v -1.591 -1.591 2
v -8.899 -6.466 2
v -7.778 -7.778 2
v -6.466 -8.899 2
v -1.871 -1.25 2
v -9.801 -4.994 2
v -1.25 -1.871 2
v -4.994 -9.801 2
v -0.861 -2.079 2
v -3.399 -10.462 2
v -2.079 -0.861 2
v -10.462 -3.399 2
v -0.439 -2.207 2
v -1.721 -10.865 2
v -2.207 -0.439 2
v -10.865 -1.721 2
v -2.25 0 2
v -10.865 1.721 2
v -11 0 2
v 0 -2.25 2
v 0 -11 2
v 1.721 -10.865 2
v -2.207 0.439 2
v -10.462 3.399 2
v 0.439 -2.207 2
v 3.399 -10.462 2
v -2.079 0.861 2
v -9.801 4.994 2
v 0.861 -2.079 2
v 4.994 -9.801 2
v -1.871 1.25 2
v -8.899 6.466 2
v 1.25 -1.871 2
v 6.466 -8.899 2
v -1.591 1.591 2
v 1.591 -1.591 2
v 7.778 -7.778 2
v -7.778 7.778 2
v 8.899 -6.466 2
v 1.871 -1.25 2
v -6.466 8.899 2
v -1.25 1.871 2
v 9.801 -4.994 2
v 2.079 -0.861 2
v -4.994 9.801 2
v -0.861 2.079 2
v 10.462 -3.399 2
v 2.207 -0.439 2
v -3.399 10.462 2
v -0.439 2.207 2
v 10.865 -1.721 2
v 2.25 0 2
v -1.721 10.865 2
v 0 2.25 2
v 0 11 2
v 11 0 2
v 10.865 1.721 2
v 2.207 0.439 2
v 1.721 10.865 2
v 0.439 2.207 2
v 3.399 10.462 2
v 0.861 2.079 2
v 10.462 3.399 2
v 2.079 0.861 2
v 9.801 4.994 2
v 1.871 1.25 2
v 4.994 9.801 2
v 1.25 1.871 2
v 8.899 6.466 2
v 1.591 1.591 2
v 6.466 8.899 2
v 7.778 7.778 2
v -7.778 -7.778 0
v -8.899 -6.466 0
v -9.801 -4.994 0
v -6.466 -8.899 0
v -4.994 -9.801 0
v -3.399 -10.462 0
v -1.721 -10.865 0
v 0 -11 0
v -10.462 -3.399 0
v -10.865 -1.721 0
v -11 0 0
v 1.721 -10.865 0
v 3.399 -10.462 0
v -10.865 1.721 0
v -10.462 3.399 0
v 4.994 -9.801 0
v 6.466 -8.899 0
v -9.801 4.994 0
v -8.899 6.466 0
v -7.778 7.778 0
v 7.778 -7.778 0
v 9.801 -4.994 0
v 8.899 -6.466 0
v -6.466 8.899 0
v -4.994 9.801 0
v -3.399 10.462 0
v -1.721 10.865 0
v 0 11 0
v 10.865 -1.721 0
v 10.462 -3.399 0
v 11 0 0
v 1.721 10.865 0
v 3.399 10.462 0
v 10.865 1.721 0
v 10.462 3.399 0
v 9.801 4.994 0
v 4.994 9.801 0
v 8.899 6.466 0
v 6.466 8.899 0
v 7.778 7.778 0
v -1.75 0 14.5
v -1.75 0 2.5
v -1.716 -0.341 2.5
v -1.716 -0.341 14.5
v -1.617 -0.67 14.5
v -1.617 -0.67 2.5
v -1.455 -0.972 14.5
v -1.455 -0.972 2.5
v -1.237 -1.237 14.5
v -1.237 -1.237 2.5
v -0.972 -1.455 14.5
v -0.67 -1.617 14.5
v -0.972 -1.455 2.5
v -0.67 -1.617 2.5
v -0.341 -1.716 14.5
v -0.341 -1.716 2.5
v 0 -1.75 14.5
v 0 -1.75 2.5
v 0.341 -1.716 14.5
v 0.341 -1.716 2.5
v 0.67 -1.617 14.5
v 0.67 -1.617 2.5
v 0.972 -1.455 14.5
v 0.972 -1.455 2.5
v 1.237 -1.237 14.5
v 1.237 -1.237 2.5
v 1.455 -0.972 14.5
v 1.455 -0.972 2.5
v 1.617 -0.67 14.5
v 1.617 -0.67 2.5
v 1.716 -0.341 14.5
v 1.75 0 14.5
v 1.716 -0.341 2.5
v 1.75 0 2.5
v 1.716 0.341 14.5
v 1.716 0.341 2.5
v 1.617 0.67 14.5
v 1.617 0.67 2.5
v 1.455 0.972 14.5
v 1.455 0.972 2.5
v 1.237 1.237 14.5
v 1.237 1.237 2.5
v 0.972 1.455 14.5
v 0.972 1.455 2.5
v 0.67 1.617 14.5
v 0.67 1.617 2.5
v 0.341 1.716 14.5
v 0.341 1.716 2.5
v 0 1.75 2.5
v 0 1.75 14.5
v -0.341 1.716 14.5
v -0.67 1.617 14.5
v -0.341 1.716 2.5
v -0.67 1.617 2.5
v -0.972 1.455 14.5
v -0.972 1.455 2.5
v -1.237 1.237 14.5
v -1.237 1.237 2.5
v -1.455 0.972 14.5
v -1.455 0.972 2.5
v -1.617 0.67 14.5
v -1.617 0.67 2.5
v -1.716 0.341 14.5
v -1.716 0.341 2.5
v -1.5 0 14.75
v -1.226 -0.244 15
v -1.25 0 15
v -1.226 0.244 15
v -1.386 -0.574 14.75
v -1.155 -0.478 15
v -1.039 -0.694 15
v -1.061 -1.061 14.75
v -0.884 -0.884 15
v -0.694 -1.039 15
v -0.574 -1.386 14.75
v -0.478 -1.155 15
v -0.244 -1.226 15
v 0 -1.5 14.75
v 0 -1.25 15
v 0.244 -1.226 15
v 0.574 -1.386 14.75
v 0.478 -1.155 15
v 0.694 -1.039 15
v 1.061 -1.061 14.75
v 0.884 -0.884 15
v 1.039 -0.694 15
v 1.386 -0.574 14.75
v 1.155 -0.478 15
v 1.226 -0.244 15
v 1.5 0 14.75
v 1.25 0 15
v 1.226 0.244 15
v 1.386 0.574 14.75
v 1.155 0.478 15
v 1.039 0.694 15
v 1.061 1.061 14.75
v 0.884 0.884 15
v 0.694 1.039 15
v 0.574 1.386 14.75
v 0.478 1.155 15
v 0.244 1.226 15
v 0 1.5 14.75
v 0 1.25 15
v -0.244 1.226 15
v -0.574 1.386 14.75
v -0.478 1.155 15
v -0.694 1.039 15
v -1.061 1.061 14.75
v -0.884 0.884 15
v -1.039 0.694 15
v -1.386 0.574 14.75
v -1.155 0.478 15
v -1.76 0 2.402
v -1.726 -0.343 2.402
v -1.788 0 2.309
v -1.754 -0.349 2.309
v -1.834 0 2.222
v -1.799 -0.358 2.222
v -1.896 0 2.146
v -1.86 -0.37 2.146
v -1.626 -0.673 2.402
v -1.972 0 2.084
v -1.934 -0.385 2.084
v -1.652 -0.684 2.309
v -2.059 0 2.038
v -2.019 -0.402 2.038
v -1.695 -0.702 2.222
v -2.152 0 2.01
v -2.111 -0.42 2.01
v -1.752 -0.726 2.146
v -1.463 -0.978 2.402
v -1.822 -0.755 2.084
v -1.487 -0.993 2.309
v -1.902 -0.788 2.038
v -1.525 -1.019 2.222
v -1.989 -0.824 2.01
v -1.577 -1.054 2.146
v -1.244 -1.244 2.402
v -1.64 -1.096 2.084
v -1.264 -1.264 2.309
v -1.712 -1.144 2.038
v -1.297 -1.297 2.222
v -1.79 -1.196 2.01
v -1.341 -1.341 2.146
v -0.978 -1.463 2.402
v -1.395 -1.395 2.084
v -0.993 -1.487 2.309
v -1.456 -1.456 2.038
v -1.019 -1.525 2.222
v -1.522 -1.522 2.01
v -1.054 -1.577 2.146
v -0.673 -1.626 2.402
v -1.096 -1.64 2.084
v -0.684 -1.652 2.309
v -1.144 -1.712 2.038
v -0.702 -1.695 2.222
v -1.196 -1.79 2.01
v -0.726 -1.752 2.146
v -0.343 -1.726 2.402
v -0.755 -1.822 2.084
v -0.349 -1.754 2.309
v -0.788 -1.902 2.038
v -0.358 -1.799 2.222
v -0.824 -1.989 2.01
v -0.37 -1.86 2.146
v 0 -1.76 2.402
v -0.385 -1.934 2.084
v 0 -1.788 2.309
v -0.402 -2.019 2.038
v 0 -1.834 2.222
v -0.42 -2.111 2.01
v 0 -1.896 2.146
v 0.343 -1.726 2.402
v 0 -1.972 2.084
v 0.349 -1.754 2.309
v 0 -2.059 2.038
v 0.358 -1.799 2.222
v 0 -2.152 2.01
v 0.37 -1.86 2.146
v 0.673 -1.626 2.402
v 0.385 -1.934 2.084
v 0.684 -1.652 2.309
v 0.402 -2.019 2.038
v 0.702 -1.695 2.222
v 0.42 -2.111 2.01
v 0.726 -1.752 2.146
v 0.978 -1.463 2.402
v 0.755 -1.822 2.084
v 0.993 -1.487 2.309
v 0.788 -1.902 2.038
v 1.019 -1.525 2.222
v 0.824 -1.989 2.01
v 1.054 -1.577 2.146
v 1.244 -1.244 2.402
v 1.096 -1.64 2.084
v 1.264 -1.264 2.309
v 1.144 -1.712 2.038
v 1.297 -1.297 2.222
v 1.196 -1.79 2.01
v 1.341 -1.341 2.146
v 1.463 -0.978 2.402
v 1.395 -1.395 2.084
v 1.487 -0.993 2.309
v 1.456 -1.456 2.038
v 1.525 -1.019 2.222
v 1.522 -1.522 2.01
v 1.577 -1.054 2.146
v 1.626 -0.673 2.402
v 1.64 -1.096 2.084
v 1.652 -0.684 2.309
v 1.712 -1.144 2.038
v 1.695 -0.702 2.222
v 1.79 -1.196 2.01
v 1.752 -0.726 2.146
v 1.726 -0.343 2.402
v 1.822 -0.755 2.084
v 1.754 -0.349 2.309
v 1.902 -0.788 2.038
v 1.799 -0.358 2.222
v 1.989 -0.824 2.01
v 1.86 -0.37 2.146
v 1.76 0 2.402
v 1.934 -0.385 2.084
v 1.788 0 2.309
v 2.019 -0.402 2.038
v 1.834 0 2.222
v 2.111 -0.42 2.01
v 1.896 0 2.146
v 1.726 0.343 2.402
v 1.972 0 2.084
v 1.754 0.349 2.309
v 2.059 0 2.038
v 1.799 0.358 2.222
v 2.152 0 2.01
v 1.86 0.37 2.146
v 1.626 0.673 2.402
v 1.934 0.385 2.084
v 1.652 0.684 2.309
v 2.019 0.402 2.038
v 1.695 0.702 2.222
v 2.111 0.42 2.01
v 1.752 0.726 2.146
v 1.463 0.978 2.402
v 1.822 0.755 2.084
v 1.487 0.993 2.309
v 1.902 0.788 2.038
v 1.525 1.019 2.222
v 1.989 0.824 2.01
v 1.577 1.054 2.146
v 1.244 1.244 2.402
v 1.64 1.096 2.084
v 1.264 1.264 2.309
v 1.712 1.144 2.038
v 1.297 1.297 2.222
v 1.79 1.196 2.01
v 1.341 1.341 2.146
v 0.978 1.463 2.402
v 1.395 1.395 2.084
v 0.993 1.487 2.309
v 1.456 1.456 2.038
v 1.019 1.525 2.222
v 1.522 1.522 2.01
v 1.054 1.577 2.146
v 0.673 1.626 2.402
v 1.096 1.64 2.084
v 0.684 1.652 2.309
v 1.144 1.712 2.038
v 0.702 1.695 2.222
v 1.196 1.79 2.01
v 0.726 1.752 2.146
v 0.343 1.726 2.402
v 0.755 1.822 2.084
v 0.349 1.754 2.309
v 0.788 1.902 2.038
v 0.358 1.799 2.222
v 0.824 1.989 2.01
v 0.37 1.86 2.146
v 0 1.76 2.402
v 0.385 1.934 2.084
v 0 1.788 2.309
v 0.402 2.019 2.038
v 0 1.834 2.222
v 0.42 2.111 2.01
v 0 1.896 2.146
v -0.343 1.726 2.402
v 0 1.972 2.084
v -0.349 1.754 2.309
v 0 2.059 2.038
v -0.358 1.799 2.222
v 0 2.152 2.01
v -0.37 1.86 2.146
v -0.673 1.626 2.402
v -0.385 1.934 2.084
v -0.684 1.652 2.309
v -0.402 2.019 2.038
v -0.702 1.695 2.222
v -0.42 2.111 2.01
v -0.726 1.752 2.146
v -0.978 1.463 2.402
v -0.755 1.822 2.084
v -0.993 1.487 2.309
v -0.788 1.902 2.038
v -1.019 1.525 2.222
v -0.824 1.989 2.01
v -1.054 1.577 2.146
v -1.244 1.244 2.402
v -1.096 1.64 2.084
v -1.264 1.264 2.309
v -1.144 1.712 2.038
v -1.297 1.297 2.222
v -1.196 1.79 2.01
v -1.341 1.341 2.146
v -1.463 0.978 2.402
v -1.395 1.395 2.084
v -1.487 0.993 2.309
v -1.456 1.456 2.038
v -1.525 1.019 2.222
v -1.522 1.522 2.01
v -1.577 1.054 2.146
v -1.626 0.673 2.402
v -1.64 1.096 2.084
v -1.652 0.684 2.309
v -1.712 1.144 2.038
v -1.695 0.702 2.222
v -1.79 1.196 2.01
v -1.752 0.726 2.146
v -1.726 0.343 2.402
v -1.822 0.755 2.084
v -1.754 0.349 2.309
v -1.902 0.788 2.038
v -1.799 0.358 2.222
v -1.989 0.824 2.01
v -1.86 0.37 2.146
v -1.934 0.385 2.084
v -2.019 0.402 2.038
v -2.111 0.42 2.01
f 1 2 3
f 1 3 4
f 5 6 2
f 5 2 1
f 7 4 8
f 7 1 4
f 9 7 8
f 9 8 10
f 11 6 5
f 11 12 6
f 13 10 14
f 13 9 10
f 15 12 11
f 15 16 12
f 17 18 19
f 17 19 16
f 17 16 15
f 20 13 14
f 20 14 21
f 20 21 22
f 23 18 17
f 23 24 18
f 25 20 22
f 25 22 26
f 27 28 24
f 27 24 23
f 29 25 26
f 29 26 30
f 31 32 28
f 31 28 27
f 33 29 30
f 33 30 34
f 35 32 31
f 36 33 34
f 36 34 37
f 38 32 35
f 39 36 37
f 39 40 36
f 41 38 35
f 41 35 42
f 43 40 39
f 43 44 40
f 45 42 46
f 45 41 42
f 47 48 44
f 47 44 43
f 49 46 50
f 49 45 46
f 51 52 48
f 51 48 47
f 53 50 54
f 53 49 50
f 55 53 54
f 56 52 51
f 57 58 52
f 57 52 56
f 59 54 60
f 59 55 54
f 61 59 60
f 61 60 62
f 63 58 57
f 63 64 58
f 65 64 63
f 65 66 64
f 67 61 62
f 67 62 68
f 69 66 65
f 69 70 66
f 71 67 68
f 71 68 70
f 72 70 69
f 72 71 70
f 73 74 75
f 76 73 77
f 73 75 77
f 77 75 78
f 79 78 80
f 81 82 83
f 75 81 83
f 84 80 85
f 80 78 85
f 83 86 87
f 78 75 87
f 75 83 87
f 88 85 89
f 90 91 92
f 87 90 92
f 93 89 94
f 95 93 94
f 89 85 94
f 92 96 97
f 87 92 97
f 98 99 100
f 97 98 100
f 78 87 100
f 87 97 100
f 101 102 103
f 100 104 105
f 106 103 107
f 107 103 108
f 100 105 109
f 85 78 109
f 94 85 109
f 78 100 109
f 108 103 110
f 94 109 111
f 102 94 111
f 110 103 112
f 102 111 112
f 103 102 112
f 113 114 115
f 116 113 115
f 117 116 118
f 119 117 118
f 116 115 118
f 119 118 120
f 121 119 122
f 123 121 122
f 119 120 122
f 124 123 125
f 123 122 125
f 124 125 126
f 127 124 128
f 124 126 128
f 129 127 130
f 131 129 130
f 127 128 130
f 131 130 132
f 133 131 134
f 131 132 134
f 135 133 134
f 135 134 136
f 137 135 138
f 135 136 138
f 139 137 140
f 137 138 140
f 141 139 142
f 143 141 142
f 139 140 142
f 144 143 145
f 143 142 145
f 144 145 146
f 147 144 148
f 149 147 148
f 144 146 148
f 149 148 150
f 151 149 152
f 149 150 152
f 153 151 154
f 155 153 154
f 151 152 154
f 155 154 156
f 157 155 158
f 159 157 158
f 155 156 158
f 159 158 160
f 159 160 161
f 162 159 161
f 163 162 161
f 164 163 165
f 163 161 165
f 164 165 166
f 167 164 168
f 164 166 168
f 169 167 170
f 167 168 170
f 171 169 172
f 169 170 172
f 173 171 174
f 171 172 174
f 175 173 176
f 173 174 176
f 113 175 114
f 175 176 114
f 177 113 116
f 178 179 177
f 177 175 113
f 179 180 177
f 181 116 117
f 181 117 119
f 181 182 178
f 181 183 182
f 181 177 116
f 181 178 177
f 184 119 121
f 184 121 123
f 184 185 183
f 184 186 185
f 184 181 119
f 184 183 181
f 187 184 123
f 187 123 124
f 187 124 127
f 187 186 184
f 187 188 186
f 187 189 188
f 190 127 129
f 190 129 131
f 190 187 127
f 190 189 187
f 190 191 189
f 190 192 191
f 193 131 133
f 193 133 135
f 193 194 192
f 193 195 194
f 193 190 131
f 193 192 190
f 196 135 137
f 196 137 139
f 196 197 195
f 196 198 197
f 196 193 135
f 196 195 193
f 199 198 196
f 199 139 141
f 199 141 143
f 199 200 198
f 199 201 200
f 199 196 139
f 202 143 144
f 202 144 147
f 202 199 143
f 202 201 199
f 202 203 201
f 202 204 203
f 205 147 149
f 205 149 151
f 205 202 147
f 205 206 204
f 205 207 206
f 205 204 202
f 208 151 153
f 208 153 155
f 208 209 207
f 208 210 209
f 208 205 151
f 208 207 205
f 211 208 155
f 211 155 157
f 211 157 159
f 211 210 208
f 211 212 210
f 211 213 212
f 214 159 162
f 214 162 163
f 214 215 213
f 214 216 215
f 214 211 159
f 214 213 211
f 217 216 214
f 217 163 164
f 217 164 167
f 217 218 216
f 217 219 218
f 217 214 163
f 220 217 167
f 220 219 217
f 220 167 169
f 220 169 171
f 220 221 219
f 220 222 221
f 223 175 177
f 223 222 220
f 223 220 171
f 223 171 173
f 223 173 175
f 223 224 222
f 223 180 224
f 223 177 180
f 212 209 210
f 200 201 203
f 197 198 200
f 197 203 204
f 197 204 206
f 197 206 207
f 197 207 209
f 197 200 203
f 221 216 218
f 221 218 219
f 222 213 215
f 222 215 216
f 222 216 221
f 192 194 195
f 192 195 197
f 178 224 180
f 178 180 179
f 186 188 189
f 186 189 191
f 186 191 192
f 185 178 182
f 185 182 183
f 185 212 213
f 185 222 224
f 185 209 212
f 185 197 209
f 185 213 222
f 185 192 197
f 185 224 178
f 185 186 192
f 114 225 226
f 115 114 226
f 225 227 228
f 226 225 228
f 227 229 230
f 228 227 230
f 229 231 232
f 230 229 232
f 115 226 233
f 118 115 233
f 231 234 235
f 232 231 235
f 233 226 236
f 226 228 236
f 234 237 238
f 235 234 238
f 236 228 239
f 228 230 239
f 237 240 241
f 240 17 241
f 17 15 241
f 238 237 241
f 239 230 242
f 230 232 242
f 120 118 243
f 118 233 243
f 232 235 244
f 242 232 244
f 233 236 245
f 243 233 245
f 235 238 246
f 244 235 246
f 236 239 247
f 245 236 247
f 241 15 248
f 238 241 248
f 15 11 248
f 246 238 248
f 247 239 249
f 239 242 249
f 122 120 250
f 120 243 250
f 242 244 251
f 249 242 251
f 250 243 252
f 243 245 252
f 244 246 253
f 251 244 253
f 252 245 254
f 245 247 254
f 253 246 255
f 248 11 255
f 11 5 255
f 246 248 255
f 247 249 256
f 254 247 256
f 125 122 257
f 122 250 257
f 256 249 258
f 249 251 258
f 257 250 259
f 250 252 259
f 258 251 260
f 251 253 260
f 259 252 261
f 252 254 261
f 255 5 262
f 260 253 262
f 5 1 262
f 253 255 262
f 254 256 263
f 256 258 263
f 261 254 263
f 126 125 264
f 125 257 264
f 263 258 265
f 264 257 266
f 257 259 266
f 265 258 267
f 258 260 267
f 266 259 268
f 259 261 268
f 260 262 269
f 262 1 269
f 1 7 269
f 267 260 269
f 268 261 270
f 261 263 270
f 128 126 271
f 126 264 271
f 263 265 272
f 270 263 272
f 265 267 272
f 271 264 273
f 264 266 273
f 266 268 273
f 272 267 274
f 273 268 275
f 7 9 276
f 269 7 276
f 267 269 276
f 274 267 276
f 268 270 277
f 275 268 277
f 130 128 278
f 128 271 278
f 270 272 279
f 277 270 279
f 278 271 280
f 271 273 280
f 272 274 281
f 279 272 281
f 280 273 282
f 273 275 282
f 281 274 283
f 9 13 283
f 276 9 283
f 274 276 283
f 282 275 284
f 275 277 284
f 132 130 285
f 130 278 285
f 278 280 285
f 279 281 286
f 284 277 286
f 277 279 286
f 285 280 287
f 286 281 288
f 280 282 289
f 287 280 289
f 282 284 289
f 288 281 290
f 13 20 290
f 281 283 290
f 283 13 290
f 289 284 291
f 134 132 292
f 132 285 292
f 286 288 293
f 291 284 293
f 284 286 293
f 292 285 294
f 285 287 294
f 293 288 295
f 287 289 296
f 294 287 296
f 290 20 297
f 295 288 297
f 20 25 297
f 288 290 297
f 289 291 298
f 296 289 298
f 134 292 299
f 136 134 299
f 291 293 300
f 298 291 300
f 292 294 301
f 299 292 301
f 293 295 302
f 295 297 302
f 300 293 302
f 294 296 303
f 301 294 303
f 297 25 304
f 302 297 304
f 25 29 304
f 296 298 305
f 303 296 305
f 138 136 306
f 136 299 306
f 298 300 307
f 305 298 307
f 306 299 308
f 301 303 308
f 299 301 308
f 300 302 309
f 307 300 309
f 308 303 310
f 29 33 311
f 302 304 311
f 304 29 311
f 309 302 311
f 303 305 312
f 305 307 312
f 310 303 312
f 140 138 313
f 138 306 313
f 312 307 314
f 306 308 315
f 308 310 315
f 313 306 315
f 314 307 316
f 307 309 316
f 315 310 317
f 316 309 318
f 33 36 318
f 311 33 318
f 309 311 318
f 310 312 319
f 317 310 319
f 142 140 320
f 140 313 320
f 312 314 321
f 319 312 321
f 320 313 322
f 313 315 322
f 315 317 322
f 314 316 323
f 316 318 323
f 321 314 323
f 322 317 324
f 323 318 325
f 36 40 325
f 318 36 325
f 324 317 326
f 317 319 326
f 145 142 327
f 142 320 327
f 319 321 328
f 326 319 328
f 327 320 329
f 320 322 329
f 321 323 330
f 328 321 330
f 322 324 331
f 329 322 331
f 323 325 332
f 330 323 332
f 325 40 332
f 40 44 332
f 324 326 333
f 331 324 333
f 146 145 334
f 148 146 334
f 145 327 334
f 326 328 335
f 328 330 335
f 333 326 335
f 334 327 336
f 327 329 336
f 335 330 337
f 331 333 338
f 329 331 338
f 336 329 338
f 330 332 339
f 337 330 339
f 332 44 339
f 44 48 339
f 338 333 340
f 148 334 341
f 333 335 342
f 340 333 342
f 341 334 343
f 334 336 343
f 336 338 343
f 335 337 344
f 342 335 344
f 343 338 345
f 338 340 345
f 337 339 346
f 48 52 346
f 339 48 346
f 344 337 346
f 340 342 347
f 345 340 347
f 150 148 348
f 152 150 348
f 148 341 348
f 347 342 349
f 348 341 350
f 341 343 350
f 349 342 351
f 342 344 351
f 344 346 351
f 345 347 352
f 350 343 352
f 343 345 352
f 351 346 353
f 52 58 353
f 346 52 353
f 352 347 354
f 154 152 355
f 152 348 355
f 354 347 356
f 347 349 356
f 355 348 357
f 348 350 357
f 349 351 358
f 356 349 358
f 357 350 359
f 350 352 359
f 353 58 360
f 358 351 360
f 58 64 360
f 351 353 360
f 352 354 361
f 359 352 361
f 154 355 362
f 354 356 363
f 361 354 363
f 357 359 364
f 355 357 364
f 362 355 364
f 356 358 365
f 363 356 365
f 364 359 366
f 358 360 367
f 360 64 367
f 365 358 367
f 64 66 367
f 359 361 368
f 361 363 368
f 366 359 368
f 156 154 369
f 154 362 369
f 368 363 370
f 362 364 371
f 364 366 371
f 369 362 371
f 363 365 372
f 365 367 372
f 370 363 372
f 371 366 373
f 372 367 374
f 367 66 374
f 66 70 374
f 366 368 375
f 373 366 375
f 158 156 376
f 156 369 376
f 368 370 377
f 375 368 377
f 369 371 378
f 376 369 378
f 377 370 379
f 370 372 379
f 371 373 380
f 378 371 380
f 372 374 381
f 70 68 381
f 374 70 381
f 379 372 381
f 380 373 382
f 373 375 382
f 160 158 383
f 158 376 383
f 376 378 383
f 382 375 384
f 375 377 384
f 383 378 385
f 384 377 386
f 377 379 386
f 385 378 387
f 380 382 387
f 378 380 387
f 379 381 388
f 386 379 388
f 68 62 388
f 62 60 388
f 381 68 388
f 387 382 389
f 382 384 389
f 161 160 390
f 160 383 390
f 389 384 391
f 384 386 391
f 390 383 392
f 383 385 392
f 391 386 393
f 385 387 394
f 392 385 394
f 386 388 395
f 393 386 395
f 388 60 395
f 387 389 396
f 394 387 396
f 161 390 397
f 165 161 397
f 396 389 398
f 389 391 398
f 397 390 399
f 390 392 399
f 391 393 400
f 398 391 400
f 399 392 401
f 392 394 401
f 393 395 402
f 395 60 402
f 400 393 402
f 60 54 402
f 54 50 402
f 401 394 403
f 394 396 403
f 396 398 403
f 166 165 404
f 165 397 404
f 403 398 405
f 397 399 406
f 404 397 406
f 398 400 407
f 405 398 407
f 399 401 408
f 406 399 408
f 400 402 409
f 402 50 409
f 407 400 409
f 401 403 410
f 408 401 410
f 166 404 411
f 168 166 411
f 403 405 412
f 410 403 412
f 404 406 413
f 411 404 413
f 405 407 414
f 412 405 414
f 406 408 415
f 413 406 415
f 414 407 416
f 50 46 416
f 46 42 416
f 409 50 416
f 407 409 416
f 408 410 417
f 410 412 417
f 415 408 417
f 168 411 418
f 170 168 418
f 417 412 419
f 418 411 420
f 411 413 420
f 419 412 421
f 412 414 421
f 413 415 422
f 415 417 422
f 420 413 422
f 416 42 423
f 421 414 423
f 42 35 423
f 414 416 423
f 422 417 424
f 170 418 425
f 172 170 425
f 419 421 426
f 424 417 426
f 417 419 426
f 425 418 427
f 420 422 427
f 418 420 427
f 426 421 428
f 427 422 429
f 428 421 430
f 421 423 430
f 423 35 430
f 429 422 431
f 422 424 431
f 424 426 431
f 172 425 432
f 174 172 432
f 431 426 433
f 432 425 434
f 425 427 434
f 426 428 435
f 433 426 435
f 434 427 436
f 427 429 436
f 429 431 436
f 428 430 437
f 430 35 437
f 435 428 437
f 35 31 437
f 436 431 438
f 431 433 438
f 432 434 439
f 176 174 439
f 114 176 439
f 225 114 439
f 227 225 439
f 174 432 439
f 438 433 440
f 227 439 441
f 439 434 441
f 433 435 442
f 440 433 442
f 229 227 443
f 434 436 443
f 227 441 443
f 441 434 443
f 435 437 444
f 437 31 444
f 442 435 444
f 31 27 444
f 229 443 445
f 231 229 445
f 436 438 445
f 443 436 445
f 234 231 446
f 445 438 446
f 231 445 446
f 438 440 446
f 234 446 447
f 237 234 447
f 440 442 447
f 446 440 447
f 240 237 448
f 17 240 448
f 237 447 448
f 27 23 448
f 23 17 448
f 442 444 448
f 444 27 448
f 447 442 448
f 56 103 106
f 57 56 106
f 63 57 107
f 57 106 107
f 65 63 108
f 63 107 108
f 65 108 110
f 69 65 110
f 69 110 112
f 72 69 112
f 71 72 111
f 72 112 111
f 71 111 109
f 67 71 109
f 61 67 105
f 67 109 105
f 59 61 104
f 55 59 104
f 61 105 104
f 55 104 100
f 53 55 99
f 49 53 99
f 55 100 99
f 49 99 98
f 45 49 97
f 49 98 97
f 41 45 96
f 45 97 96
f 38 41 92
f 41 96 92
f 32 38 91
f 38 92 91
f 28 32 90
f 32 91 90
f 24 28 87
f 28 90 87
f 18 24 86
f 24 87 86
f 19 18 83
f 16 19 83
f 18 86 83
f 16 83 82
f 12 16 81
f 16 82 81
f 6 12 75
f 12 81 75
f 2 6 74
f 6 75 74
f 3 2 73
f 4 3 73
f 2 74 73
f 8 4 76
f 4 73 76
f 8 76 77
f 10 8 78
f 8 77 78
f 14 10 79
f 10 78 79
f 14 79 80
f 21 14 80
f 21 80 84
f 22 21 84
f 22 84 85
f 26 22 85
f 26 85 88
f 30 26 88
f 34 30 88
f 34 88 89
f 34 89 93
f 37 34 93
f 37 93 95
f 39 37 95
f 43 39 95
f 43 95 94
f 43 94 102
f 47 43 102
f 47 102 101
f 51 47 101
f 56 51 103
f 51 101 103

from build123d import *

# Parameters (mm, degrees)
ESQUISSE1_R          = 11
BASE_EXTRUSION_DEPTH = 2
ESQUISSE3_R          = 1.75
BOSS_EXTRU_1_DEPTH   = 13
CHANFREIN1_SIZE      = 0.5
CONG_1_R             = 0.5


with BuildPart() as part:
    # Esquisse1 → Base-Extrusion (new body)
    with BuildSketch(Plane.XY):
        Circle(ESQUISSE1_R)
    extrude(amount=BASE_EXTRUSION_DEPTH)

    # Esquisse3 → Boss.-Extru.1 (add)
    with BuildSketch(Plane.XY.offset(2)):
        with Locations(Location((0, 0, 0), (0, 0, 180))):
            Circle(ESQUISSE3_R)
    extrude(amount=BOSS_EXTRU_1_DEPTH)

    # Chanfrein1
    chanfrein1_edges = [part.edges().sort_by_distance(p)[0] for p in [
        (1.75, 0, 15),
    ]]
    chamfer(chanfrein1_edges, length=CHANFREIN1_SIZE)

    # Congé1
    cong_1_edges = [part.edges().sort_by_distance(p)[0] for p in [
        (1.75, 0, 2),
    ]]
    fillet(cong_1_edges, radius=CONG_1_R)


solid = part.part
